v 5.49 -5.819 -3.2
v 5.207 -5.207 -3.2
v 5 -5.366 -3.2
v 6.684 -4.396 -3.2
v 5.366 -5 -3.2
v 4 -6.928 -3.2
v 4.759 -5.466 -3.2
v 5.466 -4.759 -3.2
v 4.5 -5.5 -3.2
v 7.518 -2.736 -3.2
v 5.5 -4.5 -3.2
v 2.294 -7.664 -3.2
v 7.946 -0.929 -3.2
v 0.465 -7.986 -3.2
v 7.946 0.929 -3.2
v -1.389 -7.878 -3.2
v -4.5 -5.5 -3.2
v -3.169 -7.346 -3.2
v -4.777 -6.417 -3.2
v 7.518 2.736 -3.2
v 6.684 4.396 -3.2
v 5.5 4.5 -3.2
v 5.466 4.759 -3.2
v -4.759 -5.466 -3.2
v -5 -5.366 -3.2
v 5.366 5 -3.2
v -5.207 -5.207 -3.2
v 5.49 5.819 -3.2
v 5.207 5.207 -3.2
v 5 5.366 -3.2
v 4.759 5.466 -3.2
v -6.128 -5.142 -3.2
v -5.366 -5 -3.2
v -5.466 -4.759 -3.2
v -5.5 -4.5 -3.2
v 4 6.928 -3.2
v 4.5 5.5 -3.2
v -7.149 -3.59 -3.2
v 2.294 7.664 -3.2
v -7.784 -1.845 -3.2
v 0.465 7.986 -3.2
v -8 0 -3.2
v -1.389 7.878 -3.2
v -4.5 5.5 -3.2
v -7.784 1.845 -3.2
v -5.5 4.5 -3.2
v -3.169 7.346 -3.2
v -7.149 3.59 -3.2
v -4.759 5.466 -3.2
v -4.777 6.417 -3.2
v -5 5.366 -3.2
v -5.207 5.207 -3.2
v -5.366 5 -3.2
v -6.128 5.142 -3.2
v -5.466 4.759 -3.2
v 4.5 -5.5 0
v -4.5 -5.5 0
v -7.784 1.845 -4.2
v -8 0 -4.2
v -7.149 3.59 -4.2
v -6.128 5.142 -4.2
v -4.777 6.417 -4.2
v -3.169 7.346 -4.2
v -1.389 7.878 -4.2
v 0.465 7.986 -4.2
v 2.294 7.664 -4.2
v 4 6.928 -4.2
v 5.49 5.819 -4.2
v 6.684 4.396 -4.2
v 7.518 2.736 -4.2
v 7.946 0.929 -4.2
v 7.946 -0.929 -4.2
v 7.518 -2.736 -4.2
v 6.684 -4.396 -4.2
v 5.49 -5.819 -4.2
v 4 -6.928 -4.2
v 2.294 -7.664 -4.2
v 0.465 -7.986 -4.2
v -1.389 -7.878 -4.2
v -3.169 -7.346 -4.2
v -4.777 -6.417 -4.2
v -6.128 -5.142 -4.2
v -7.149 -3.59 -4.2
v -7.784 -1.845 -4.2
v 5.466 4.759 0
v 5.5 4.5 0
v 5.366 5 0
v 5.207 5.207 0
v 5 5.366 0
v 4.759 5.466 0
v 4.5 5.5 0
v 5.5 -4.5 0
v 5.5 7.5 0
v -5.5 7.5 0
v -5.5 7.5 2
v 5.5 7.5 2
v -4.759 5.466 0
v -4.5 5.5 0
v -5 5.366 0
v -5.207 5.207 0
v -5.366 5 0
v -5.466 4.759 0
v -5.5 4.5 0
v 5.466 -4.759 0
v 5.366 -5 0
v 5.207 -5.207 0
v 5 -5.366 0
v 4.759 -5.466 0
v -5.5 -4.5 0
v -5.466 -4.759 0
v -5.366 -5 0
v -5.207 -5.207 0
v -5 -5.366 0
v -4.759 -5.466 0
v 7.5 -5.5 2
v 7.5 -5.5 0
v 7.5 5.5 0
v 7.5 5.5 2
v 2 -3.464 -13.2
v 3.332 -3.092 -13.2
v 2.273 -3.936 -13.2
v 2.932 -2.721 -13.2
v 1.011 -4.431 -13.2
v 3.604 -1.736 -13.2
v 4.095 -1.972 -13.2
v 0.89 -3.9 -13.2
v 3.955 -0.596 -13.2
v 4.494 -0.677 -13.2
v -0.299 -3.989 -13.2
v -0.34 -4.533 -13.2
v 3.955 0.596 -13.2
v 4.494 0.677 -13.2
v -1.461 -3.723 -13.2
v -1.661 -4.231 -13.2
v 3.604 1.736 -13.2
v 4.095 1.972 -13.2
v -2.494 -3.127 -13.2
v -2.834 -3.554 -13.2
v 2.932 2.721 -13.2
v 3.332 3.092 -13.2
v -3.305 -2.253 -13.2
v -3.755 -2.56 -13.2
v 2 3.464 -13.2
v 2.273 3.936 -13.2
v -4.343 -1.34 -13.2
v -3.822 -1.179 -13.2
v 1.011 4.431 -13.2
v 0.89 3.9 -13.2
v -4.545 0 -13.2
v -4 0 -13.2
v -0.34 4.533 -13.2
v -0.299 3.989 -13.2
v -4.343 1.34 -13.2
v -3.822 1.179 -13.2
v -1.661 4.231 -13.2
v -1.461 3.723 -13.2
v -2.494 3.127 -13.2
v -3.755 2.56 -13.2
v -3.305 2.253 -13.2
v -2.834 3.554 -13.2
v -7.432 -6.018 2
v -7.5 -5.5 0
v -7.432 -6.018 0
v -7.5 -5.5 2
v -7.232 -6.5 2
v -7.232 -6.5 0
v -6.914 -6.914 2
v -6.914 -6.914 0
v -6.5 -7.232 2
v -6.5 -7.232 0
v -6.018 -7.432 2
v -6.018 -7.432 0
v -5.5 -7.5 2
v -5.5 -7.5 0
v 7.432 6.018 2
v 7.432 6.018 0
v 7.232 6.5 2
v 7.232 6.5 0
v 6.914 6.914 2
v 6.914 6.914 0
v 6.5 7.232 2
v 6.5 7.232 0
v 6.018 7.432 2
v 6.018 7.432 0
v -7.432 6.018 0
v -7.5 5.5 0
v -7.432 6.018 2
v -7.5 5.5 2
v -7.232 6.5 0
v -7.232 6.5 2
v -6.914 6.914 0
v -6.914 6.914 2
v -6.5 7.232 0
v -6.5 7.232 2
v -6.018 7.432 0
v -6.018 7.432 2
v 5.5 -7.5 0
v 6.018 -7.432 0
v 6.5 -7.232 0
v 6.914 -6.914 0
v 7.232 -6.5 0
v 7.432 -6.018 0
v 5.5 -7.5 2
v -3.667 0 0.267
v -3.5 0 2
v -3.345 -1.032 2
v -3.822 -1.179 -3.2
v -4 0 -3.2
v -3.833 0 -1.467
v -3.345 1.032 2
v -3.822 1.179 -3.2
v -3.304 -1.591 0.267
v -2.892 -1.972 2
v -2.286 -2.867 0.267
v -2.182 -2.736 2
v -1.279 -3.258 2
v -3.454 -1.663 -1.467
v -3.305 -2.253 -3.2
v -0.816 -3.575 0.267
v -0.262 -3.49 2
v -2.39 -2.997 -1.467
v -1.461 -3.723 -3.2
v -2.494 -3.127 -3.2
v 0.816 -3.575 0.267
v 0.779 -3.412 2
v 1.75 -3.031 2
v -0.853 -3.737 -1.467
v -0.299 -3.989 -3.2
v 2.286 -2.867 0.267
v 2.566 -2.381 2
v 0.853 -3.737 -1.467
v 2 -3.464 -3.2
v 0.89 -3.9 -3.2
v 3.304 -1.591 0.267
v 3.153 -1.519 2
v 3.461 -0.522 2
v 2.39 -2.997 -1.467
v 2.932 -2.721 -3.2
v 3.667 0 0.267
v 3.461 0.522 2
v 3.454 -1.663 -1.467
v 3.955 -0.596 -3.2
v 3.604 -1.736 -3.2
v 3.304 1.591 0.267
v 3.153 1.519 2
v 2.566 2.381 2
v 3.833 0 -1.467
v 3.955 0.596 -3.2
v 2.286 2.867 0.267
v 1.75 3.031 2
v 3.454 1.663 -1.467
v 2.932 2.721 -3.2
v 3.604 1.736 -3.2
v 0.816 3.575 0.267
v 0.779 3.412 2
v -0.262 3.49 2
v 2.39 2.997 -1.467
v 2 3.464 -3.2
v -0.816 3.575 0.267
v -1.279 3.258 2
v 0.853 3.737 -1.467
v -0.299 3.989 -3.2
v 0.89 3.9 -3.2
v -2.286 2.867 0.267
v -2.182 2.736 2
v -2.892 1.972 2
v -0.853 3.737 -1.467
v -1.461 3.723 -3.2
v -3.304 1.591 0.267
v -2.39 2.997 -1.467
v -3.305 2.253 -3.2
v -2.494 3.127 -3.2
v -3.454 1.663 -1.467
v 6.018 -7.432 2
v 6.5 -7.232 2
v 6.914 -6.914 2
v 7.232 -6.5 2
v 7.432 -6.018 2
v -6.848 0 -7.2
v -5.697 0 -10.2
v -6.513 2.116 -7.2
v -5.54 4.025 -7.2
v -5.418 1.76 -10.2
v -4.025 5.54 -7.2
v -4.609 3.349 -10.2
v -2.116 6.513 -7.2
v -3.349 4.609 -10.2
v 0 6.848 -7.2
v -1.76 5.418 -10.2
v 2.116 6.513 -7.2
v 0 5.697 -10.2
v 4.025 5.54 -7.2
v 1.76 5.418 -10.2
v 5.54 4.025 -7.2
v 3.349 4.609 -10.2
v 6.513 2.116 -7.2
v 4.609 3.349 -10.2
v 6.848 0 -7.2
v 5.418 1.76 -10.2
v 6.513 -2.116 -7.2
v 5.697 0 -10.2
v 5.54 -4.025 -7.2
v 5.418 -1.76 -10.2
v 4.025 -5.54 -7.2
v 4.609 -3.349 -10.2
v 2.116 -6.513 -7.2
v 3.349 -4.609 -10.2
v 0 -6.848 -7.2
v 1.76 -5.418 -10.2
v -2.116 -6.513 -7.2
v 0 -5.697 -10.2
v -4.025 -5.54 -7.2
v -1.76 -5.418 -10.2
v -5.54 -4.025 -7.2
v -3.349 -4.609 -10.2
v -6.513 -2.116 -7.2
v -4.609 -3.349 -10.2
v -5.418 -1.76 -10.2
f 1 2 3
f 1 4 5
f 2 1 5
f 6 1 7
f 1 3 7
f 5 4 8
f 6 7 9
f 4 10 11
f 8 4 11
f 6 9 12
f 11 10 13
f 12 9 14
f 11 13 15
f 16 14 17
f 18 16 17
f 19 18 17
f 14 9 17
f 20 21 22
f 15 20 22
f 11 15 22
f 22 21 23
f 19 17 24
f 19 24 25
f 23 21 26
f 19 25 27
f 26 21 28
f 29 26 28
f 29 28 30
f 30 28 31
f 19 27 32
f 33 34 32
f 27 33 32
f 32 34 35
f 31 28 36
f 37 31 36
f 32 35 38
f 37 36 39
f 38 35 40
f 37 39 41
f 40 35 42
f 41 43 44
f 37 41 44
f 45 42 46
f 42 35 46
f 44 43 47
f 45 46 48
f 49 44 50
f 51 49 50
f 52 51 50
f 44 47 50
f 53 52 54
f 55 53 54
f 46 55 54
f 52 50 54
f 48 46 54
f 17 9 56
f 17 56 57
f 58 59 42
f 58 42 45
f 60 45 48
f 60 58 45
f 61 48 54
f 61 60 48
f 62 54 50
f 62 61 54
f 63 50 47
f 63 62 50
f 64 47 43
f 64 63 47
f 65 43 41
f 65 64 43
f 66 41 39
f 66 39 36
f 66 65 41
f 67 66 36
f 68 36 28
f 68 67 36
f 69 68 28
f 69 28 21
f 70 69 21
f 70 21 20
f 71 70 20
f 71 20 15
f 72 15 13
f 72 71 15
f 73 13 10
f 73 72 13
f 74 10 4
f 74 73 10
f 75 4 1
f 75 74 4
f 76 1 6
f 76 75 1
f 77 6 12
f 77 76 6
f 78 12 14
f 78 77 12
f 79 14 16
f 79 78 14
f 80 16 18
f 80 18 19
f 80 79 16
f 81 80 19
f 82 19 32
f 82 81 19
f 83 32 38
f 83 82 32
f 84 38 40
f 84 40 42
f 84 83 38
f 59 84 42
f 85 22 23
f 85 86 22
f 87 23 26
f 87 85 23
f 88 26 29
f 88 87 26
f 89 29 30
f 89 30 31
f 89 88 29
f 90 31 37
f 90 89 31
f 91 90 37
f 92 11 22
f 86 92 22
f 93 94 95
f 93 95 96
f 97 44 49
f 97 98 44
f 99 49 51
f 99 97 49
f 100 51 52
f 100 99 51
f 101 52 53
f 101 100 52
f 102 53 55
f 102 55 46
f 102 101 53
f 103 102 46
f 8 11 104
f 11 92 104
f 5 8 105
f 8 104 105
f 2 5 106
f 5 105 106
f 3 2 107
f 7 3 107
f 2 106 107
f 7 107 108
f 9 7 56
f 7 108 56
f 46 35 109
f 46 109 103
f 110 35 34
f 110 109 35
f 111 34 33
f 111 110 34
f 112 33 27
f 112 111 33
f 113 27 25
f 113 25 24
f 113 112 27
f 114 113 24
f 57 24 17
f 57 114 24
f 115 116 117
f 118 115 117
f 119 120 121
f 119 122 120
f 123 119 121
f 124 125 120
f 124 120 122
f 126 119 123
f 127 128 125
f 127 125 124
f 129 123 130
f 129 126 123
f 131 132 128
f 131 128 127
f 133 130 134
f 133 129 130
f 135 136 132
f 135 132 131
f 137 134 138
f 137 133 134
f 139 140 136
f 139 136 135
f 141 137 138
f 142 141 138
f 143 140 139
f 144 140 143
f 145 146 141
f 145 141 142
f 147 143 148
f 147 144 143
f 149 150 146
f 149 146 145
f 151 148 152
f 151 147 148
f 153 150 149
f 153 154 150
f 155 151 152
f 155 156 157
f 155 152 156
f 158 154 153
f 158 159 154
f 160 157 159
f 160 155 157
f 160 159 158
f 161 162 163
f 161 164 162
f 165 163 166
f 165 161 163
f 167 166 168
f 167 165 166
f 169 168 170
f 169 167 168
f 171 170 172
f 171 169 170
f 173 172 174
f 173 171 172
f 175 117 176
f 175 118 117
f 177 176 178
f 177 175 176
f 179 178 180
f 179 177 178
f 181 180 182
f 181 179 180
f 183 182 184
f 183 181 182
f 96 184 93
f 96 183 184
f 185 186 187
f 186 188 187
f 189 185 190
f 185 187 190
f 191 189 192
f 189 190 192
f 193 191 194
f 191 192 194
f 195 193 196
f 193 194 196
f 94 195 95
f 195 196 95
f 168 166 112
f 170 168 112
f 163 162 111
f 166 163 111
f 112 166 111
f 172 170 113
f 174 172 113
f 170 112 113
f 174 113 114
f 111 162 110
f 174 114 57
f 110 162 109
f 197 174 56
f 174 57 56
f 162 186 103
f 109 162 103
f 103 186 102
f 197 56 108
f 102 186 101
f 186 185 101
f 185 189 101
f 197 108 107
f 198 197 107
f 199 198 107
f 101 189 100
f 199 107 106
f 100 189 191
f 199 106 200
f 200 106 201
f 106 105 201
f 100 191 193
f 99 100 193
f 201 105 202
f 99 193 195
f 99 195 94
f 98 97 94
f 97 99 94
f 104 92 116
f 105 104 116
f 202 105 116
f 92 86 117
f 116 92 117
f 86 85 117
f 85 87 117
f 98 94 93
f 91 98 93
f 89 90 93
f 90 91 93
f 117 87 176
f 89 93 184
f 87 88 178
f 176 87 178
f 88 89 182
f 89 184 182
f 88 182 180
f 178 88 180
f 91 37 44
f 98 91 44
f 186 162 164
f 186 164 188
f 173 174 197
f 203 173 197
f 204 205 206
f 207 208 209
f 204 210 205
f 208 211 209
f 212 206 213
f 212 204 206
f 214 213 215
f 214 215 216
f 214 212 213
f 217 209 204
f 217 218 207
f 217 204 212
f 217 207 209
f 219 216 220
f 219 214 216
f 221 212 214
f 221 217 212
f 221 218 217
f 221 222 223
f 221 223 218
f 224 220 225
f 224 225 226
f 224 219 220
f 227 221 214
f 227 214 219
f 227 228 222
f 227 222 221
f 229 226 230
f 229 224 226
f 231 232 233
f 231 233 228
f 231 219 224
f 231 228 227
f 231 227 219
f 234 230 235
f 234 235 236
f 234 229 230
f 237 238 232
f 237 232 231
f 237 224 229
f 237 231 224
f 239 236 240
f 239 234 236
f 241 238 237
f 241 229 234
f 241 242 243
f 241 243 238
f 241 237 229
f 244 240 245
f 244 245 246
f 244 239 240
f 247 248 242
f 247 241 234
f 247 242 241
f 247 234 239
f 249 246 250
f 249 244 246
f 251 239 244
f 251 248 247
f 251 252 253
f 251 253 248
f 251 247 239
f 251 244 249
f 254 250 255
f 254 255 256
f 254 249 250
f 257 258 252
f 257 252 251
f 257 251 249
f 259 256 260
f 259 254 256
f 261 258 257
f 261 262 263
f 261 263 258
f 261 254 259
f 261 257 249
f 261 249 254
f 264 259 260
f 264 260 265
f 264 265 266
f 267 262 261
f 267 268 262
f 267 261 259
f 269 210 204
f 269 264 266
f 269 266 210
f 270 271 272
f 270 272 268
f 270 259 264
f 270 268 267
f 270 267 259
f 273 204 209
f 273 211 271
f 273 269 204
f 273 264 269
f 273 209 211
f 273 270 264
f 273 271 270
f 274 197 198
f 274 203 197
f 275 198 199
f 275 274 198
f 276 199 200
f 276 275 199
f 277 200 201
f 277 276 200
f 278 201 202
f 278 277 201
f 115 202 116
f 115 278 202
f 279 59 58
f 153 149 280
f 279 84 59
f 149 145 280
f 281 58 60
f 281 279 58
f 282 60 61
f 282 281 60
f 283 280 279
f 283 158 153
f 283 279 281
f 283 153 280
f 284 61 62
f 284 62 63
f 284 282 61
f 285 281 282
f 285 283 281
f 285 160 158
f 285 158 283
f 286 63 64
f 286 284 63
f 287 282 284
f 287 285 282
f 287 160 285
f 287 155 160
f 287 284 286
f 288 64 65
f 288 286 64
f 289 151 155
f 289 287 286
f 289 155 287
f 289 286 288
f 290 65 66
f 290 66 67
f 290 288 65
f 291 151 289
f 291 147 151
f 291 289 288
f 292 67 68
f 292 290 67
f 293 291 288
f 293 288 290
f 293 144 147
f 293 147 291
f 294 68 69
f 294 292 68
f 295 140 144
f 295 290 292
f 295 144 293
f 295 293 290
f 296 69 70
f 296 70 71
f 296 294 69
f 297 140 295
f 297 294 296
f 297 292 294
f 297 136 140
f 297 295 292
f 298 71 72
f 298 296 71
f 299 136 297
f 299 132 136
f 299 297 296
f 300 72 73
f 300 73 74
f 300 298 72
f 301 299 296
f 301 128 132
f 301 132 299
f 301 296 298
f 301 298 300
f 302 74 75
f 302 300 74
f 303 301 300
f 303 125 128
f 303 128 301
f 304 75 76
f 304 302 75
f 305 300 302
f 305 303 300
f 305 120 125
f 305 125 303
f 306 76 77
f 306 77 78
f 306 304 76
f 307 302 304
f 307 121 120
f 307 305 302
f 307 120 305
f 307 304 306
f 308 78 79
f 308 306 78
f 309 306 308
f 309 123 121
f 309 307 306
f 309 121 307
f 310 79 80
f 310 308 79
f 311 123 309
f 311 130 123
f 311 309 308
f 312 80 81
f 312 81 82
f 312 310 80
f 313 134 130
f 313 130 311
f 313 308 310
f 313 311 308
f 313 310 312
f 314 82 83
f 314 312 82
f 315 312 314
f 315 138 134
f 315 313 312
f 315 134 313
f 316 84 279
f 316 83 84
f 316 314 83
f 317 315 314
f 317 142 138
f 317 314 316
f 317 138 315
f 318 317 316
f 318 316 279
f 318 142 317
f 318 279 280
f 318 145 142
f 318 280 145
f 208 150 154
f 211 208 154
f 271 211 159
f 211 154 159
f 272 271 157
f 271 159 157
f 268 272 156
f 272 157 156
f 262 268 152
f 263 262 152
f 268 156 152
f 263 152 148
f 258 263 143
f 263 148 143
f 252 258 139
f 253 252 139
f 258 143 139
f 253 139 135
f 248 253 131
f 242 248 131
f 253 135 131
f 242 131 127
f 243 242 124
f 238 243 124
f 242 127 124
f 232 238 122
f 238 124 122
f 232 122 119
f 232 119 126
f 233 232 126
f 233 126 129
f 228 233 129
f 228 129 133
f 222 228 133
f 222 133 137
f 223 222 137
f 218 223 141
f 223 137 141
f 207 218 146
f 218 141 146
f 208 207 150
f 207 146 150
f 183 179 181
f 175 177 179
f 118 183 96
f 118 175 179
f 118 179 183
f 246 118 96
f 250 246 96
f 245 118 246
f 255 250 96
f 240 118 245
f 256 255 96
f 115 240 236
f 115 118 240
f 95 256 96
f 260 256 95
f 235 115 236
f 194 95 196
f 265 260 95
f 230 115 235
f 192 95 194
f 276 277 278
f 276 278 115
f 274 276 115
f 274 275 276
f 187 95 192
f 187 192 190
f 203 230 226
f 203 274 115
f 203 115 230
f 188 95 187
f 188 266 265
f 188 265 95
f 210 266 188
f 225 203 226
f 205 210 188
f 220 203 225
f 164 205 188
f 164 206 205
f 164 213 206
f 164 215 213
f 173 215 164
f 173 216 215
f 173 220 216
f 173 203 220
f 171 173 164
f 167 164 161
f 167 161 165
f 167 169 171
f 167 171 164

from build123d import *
from build123d.topology import SkipClean

# Parameters (mm, degrees)
SKETCH1_W           = 15
SKETCH1_H           = 15
SKETCH1_R           = 4
BOSS_EXTRUDE1_DEPTH = 2
BOSS_EXTRUDE2_START = 3.2
SKETCH2_W           = 11
SKETCH2_H           = 11
SKETCH2_R           = 4
BOSS_EXTRUDE2_DEPTH = 3.2
BOSS_EXTRUDE3_START = 10
SKETCH3_R           = 8
SKETCH3_R_2         = 4
BOSS_EXTRUDE3_DEPTH = 10
CHAMFER1_SIZE       = 9
CHAMFER1_SIZE2      = 3.454776315
FILLET1_R           = 2
FILLET2_R           = 1


with BuildPart() as part:
    # Sketch1 → Boss-Extrude1 (new body)
    with BuildSketch(Plane.XY):
        Rectangle(SKETCH1_W, SKETCH1_H)
        Circle(SKETCH1_R, mode=Mode.SUBTRACT)
    extrude(amount=BOSS_EXTRUDE1_DEPTH)

    # Sketch2 → Boss-Extrude2 (add)
    with SkipClean():  # the faces are left unmerged after this step: merging them gives an invalid solid
        with BuildSketch(Plane(origin=(0, 0, 0), x_dir=(-1, 0, 0), z_dir=(0, 0, -1)).offset(BOSS_EXTRUDE2_START)):
            Rectangle(SKETCH2_W, SKETCH2_H)
            Circle(SKETCH2_R, mode=Mode.SUBTRACT)
        extrude(amount=-BOSS_EXTRUDE2_DEPTH)

    # Sketch3 → Boss-Extrude3 (add)
    with SkipClean():  # the faces are left unmerged after this step: merging them gives an invalid solid
        with BuildSketch(Plane(origin=(0, 0, -3.2), x_dir=(-1, 0, 0), z_dir=(0, 0, -1)).offset(BOSS_EXTRUDE3_START)):
            Circle(SKETCH3_R)
            Circle(SKETCH3_R_2, mode=Mode.SUBTRACT)
        extrude(amount=-BOSS_EXTRUDE3_DEPTH)

    # Sketch4 → Revolve1 (revolve)
    with BuildSketch(Plane(origin=(0, 0, 0), x_dir=(1, 0, 0), z_dir=(0, 1, 0))):
        Polygon((-4, -2), (-3.5, -2), (-4, 3.2), align=None)
    revolve(axis=Axis((0, 0, -13.2), (0, 0, 1)))

    # Chamfer1
    chamfer1_edges = [part.edges().sort_by_distance(p)[0] for p in [
        (8, 0, -13.2),
    ]]
    chamfer1_side = [part.faces().sort_by_distance(p)[0] for p in [
        (8, 0, -8.2),
    ]]
    chamfer(chamfer1_edges, length=CHAMFER1_SIZE, length2=CHAMFER1_SIZE2, reference=chamfer1_side[0])

    # Fillet1
    fillet1_edges = [part.edges().sort_by_distance(p)[0] for p in [
        (7.5, -7.5, 1),
        (-7.5, -7.5, 1),
        (-7.5, 7.5, 1),
        (7.5, 7.5, 1),
    ]]
    fillet(fillet1_edges, radius=FILLET1_R)

    # Fillet2
    fillet2_edges = [part.edges().sort_by_distance(p)[0] for p in [
        (-5.5, -5.5, -1.6),
        (-5.5, 5.5, -1.6),
        (5.5, 5.5, -1.6),
        (5.5, -5.5, -1.6),
    ]]
    fillet(fillet2_edges, radius=FILLET2_R)


solid = part.part
